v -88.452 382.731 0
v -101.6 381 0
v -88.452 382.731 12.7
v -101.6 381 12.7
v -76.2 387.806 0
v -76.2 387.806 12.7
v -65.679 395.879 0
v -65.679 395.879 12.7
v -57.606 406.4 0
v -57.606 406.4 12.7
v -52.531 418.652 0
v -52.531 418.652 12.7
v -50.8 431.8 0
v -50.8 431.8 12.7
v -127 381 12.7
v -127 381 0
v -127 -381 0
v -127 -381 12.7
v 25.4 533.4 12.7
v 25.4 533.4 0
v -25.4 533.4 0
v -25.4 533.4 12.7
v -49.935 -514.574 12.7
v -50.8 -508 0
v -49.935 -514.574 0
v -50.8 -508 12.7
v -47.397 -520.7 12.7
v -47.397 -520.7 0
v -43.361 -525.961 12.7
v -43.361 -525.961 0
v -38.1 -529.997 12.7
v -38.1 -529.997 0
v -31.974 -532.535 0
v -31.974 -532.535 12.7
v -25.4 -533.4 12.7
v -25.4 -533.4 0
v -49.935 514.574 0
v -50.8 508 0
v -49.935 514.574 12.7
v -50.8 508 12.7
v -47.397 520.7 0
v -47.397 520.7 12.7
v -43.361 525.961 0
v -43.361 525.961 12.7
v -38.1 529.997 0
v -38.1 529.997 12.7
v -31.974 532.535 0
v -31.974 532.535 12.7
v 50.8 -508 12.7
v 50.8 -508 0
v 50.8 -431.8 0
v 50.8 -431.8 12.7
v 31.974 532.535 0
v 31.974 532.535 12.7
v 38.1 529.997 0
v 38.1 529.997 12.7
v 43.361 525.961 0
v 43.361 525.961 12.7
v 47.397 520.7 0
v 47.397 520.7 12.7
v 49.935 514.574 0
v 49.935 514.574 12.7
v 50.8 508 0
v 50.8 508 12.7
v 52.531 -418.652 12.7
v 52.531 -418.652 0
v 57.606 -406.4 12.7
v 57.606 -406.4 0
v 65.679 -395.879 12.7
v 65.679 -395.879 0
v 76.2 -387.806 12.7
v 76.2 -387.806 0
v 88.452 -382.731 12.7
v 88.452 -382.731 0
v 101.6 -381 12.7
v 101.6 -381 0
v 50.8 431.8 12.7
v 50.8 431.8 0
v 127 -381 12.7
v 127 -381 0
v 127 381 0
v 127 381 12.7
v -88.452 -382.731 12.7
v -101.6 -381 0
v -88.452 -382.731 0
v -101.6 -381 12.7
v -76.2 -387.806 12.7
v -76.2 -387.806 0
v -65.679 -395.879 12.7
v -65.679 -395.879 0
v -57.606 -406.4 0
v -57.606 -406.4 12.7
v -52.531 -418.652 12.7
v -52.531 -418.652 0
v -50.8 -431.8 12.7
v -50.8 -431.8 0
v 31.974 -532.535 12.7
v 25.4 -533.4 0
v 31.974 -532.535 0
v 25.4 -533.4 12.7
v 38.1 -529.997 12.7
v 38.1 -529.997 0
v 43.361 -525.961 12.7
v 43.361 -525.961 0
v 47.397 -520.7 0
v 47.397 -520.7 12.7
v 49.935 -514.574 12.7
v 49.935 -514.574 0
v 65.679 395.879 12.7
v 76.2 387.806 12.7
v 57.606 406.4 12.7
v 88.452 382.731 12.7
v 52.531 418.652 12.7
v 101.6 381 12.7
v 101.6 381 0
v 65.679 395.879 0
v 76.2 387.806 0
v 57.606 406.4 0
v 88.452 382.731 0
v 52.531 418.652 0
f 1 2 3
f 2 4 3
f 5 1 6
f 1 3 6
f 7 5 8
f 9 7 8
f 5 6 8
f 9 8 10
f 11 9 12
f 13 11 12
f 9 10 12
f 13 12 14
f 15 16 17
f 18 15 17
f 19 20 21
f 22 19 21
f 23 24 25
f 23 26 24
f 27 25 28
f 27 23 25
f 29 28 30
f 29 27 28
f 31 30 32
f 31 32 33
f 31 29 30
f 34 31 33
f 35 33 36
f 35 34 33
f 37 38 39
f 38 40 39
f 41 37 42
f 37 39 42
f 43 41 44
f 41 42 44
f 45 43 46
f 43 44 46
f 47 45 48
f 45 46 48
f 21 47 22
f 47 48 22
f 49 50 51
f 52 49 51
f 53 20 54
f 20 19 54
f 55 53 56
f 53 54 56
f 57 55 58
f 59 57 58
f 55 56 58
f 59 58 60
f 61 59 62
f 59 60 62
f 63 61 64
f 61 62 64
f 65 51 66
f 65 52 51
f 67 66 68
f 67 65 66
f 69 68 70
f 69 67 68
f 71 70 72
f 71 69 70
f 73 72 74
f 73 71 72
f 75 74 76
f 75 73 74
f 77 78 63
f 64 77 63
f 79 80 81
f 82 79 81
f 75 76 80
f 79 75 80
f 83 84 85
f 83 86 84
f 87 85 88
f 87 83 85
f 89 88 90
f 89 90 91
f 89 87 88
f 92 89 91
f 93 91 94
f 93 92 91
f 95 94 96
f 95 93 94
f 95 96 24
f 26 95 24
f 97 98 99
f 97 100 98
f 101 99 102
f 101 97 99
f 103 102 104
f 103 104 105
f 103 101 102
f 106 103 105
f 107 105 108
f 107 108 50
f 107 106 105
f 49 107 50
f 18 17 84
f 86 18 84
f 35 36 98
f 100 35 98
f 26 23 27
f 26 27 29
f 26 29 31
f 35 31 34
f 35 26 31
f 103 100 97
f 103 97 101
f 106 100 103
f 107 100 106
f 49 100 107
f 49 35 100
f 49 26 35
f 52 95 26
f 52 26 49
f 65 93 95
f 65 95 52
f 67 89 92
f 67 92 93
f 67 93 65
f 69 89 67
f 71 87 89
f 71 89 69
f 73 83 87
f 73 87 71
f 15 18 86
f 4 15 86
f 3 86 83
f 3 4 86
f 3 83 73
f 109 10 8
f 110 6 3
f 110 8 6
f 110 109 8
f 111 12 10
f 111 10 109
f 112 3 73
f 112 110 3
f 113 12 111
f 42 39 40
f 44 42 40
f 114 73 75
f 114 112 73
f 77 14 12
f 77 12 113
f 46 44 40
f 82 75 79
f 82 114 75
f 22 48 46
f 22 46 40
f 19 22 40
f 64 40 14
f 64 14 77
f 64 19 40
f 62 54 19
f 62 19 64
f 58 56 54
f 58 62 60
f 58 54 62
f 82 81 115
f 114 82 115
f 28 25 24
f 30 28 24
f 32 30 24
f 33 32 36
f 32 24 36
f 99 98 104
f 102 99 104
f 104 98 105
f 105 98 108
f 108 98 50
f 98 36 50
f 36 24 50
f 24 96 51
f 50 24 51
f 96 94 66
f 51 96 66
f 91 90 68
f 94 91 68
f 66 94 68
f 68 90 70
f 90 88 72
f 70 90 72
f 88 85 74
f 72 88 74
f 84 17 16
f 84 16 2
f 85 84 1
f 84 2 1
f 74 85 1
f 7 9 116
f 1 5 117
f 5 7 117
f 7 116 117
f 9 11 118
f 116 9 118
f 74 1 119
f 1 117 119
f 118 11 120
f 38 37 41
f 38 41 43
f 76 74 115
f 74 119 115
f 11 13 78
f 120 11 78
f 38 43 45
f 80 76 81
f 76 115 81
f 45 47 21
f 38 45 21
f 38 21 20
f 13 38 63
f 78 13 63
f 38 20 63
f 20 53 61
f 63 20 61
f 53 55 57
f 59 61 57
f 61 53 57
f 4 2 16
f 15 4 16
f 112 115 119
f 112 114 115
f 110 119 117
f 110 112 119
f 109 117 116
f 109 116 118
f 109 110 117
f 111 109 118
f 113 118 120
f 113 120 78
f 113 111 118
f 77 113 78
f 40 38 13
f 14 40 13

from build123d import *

# Parameters (mm, degrees)
F1_DEPTH = 12.7
F2_R     = 50.8
F3_R     = 25.4


with BuildPart() as f1:
    # F0 (on Top) → F1 (new body)
    with BuildSketch(Plane.XY):
        Polygon((-50.8, 381), (-127, 381), (-127, 0), (-127, -381), (-50.8, -381), (-50.8, -533.4), (50.8, -533.4), (50.8, -381), (127, -381), (127, 0), (127, 381), (50.8, 381), (50.8, 533.4), (-50.8, 533.4), align=None)
    extrude(amount=F1_DEPTH)

    # F2
    f2_edges = [f1.edges().sort_by_distance(p)[0] for p in [
        (-50.8, 381, 6.35),
        (50.8, 381, 6.35),
        (-50.8, -381, 6.35),
        (50.8, -381, 6.35),
    ]]
    fillet(f2_edges, radius=F2_R)

    # F3
    f3_edges = [f1.edges().sort_by_distance(p)[0] for p in [
        (-50.8, -533.4, 6.35),
        (50.8, -533.4, 6.35),
        (50.8, 533.4, 6.35),
        (-50.8, 533.4, 6.35),
    ]]
    fillet(f3_edges, radius=F3_R)


solid = f1.part
